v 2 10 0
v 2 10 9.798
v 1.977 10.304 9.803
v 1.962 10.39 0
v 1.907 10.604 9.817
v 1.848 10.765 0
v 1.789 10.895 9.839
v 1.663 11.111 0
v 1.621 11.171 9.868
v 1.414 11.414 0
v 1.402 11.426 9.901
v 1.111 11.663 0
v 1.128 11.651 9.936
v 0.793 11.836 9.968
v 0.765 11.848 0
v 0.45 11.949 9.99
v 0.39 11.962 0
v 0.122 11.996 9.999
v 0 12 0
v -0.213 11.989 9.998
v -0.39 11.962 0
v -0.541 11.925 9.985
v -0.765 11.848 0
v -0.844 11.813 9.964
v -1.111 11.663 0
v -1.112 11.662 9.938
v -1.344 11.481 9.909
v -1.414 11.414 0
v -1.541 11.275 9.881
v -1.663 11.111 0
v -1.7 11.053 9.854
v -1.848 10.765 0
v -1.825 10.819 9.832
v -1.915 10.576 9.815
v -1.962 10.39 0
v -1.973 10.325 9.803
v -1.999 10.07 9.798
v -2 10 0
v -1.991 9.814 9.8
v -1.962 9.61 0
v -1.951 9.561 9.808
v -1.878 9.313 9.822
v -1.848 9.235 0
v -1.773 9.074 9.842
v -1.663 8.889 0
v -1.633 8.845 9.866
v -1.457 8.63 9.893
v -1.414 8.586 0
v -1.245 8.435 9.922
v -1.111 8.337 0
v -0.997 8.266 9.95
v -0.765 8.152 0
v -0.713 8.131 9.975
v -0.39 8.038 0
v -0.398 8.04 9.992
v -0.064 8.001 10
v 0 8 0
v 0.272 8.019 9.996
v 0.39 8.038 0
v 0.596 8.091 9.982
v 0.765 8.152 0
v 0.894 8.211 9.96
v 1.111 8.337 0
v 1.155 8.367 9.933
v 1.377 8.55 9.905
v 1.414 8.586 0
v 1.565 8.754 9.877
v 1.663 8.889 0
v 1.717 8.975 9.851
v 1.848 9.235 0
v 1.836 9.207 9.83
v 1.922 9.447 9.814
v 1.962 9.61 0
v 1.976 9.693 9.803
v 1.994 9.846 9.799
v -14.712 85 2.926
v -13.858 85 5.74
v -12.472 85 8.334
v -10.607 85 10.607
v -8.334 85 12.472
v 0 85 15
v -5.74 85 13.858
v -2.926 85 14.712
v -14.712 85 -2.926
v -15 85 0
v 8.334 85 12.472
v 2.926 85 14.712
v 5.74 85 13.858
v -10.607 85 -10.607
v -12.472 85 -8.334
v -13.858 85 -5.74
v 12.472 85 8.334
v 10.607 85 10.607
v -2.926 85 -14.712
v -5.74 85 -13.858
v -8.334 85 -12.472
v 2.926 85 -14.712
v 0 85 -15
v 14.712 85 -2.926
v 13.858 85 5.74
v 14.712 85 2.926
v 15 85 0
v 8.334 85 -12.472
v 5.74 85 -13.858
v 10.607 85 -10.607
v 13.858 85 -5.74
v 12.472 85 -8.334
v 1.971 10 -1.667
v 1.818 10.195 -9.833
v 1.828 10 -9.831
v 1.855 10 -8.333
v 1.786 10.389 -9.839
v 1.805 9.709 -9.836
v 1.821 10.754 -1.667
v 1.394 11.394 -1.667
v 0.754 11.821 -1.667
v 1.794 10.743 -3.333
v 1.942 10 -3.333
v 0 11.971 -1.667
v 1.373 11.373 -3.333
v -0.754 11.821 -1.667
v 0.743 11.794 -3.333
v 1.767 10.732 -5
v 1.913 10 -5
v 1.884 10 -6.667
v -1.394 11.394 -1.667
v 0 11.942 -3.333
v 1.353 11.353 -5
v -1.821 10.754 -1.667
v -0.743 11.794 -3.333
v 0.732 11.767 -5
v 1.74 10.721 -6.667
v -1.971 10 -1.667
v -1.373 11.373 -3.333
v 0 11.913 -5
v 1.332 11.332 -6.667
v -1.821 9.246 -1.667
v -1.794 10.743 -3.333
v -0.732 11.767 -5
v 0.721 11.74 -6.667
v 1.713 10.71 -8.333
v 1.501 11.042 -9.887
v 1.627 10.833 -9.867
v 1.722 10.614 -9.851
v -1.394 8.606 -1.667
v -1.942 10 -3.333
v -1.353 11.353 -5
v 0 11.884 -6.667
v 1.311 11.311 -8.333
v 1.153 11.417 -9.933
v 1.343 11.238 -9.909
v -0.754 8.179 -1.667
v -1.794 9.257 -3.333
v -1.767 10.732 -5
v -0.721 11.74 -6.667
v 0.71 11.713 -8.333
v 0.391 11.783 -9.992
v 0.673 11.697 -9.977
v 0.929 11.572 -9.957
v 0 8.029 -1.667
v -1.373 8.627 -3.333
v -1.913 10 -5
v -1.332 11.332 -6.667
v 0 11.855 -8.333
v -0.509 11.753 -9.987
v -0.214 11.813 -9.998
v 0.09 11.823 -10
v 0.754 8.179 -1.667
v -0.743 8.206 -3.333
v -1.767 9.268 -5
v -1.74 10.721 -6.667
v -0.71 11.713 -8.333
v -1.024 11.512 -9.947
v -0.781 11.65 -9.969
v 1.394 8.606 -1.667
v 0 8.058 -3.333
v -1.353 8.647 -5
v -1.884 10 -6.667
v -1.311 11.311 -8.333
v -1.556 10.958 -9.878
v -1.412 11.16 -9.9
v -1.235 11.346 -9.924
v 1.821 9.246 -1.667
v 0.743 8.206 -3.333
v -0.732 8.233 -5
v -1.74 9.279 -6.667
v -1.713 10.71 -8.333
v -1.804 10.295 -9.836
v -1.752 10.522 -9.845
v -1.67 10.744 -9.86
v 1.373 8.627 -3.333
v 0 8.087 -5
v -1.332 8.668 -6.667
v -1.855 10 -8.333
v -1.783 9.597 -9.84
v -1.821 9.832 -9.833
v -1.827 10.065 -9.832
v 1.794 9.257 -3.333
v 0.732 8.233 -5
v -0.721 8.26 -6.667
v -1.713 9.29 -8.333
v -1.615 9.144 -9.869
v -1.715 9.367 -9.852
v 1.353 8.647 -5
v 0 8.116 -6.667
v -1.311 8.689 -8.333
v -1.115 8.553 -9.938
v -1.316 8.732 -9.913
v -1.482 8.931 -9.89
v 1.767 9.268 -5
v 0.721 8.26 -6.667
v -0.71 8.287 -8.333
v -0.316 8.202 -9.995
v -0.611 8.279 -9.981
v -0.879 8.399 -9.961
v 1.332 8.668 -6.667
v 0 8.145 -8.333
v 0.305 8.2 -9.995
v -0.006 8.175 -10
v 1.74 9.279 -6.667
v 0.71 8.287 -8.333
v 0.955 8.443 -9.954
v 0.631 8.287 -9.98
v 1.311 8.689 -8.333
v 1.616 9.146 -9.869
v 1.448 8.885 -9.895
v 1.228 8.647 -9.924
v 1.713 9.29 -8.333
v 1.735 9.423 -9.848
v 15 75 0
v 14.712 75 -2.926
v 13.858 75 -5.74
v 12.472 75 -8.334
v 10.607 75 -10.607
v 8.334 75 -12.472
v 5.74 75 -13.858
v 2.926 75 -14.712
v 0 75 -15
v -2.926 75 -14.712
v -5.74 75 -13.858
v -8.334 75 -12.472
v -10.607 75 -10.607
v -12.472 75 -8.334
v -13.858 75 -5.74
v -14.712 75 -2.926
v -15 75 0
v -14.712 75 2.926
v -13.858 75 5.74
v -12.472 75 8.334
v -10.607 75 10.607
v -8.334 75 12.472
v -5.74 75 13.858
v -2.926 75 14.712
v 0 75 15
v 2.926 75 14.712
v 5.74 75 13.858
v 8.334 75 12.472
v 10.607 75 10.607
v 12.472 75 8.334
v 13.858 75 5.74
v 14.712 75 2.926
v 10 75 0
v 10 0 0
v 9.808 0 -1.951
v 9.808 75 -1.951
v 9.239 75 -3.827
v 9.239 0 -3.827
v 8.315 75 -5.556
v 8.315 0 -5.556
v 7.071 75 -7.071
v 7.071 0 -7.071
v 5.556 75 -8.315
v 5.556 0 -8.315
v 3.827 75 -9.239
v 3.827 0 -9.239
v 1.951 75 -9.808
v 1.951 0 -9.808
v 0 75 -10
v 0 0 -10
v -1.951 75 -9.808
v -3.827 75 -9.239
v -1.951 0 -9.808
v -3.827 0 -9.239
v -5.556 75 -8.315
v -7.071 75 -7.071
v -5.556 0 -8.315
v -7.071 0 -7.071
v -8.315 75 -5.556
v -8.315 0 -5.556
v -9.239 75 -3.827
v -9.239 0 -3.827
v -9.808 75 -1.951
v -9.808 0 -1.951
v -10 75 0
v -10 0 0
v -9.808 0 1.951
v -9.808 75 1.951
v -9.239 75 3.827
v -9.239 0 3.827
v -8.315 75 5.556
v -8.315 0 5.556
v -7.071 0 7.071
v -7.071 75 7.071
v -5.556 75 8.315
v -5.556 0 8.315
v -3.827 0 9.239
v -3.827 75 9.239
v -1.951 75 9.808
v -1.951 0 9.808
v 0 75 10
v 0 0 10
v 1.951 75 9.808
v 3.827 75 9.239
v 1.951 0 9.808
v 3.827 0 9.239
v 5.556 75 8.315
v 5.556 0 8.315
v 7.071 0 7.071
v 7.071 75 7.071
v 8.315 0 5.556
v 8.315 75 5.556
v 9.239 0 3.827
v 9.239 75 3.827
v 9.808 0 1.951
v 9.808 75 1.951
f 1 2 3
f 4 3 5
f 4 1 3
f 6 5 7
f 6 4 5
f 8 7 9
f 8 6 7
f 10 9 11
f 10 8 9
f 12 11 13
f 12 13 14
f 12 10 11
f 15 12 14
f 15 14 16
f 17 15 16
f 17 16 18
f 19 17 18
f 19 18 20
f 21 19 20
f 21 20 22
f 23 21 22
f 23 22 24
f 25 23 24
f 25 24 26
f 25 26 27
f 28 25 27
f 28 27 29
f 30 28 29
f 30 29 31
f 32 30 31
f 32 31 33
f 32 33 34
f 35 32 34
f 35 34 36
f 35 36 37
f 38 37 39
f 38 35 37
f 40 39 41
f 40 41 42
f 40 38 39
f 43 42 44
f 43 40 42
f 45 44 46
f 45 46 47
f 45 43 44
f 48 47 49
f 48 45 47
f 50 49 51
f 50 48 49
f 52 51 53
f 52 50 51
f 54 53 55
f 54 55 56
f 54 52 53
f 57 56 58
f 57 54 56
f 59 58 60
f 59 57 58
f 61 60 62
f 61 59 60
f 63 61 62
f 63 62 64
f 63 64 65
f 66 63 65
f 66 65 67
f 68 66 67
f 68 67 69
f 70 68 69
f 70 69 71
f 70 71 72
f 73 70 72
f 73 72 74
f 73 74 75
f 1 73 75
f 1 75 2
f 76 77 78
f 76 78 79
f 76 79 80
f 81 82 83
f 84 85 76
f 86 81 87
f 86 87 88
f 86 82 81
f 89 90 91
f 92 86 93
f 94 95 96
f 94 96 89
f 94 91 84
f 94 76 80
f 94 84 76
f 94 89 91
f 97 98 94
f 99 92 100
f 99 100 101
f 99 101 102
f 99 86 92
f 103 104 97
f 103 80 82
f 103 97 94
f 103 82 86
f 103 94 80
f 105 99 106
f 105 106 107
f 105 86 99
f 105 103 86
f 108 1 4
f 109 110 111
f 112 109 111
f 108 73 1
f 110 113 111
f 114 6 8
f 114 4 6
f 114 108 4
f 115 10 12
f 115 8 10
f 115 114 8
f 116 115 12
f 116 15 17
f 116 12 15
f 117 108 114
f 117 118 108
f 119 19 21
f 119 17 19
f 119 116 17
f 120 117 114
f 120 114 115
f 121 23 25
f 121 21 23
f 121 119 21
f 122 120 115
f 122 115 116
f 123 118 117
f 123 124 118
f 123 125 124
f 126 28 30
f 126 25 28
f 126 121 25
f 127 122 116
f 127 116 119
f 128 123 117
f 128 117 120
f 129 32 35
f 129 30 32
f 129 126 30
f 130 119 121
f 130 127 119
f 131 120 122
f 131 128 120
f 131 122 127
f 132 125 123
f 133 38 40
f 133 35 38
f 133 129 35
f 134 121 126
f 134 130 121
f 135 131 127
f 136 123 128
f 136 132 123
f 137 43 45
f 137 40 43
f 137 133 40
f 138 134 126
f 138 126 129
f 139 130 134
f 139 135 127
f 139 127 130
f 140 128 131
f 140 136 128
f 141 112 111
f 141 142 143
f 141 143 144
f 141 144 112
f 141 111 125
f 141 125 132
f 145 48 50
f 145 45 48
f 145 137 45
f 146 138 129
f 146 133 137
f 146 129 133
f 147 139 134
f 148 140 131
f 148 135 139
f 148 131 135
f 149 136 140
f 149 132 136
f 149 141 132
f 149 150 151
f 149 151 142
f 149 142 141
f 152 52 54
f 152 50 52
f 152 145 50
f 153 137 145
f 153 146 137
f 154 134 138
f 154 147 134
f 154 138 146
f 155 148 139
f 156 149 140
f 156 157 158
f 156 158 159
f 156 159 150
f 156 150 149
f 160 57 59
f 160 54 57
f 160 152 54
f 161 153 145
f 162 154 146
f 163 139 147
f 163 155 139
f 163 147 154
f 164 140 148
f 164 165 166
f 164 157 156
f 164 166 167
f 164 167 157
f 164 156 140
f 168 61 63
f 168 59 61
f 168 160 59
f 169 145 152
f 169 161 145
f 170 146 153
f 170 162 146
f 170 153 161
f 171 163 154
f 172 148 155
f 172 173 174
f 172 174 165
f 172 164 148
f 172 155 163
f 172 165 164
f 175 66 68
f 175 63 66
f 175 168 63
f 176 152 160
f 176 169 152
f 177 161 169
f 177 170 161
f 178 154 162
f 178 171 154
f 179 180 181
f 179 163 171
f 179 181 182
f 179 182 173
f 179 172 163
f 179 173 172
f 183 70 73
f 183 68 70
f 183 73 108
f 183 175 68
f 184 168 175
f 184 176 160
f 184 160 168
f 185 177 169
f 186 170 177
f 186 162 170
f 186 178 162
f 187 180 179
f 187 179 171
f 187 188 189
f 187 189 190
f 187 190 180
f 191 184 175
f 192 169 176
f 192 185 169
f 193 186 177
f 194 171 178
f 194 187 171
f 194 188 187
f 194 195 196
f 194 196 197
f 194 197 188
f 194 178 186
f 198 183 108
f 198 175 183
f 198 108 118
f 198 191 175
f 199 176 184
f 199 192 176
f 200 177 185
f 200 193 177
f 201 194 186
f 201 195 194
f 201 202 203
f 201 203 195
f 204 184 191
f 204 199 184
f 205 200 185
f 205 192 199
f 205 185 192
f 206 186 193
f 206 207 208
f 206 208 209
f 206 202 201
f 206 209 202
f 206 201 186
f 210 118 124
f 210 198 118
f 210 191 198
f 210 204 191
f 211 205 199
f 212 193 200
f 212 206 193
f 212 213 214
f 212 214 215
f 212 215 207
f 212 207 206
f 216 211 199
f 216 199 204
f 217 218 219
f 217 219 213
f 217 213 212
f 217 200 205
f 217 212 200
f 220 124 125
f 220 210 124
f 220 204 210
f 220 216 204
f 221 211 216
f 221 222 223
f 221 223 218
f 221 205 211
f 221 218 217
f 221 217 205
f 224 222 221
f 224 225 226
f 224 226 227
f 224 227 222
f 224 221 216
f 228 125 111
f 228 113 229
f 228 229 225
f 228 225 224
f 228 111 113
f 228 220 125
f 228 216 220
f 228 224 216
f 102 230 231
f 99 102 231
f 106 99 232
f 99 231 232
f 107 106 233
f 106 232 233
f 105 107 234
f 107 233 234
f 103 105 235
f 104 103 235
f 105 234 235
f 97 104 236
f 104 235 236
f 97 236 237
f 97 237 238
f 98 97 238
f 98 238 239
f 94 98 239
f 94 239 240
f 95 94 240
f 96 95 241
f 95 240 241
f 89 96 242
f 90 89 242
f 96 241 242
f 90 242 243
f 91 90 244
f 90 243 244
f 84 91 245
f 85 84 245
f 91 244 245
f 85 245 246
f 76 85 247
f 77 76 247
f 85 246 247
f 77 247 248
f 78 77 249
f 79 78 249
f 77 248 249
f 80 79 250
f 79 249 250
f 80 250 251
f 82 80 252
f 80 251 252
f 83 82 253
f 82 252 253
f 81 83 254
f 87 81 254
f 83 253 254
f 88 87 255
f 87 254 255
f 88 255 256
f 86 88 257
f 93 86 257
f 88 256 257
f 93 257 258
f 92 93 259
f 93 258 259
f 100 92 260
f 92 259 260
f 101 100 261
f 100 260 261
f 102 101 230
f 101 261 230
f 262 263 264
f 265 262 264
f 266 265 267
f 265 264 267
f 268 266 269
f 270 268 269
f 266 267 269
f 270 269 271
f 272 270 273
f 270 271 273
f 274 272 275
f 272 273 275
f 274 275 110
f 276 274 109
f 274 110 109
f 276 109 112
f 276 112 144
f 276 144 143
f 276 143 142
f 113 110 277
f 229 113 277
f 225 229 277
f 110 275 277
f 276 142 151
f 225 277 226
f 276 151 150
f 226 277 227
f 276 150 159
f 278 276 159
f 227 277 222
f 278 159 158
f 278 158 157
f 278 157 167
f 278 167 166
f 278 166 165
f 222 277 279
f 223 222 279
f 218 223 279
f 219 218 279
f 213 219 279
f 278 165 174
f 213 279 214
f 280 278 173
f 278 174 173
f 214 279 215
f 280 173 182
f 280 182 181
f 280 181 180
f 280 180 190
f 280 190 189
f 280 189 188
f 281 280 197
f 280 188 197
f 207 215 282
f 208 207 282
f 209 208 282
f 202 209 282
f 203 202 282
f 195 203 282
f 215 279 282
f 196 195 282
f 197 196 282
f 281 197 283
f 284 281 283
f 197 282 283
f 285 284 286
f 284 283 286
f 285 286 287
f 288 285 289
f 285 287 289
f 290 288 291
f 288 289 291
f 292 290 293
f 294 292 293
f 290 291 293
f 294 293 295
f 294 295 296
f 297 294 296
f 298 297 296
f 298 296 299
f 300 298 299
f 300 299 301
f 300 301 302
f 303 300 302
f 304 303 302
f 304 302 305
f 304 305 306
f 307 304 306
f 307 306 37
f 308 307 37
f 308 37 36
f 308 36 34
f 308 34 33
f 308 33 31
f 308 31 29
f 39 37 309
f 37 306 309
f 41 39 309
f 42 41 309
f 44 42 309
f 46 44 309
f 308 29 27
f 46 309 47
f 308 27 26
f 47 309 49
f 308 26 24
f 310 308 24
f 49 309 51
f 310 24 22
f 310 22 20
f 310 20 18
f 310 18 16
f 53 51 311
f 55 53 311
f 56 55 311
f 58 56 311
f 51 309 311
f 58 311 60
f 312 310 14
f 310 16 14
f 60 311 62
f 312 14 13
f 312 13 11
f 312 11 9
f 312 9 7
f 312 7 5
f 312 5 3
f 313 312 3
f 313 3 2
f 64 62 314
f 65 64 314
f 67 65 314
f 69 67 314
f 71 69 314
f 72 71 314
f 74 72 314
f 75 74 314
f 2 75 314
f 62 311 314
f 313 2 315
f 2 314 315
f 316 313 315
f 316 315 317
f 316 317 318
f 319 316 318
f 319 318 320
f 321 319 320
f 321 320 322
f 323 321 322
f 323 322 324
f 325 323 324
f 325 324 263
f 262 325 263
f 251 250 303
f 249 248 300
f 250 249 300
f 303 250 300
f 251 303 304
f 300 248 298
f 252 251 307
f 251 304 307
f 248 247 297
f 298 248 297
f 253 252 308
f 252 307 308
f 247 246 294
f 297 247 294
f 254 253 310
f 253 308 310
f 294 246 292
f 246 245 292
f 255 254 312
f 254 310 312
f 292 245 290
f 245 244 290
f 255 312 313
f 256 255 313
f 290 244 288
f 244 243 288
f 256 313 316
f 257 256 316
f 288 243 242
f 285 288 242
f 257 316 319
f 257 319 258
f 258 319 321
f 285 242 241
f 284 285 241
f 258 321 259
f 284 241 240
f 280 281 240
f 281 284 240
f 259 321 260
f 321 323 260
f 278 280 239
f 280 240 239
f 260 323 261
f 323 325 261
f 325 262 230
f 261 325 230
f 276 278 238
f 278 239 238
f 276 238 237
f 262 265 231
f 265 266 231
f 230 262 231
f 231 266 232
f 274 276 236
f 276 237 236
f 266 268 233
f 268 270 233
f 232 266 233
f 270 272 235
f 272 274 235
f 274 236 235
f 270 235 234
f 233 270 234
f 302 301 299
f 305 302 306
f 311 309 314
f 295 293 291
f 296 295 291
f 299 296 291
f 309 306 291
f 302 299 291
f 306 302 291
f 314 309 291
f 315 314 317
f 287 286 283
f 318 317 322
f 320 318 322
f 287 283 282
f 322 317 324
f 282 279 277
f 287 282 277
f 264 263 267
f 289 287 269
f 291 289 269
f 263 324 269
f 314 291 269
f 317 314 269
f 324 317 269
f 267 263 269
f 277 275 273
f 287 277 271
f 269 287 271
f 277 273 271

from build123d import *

# Parameters (mm, degrees)
SKETCH1_R                    = 10
BOSS_EXTRUDE1_DEPTH          = 75
SKETCH2_R                    = 15
BOSS_EXTRUDE2_DEPTH          = 10
SKETCH3_R                    = 2
CUT_EXTRUDE1_DEPTH           = 30
CUT_EXTRUDE1_TAPER           = 1
CUT_EXTRUDE1_OTHER_WAY_DEPTH = 30


with BuildPart() as part:
    # Sketch1 → Boss-Extrude1 (new body)
    with BuildSketch(Plane(origin=(0, 0, 0), x_dir=(1, 0, 0), z_dir=(0, 1, 0))):
        Circle(SKETCH1_R)
    extrude(amount=BOSS_EXTRUDE1_DEPTH)

    # Sketch2 → Boss-Extrude2 (add)
    with BuildSketch(Plane(origin=(0, 75, 0), x_dir=(1, 0, 0), z_dir=(0, 1, 0))):
        Circle(SKETCH2_R)
    extrude(amount=BOSS_EXTRUDE2_DEPTH)

    # Sketch3 → Cut-Extrude1 (cut)
    with BuildSketch(Plane.XY):
        with Locations((0, 10)):
            Circle(SKETCH3_R)
    extrude(amount=-CUT_EXTRUDE1_DEPTH, taper=CUT_EXTRUDE1_TAPER, mode=Mode.SUBTRACT)

    # Sketch3 → Cut-Extrude1 other way (cut)
    with BuildSketch(Plane.XY):
        with Locations((0, 10)):
            Circle(SKETCH3_R)
    extrude(amount=CUT_EXTRUDE1_OTHER_WAY_DEPTH, mode=Mode.SUBTRACT)


solid = part.part
